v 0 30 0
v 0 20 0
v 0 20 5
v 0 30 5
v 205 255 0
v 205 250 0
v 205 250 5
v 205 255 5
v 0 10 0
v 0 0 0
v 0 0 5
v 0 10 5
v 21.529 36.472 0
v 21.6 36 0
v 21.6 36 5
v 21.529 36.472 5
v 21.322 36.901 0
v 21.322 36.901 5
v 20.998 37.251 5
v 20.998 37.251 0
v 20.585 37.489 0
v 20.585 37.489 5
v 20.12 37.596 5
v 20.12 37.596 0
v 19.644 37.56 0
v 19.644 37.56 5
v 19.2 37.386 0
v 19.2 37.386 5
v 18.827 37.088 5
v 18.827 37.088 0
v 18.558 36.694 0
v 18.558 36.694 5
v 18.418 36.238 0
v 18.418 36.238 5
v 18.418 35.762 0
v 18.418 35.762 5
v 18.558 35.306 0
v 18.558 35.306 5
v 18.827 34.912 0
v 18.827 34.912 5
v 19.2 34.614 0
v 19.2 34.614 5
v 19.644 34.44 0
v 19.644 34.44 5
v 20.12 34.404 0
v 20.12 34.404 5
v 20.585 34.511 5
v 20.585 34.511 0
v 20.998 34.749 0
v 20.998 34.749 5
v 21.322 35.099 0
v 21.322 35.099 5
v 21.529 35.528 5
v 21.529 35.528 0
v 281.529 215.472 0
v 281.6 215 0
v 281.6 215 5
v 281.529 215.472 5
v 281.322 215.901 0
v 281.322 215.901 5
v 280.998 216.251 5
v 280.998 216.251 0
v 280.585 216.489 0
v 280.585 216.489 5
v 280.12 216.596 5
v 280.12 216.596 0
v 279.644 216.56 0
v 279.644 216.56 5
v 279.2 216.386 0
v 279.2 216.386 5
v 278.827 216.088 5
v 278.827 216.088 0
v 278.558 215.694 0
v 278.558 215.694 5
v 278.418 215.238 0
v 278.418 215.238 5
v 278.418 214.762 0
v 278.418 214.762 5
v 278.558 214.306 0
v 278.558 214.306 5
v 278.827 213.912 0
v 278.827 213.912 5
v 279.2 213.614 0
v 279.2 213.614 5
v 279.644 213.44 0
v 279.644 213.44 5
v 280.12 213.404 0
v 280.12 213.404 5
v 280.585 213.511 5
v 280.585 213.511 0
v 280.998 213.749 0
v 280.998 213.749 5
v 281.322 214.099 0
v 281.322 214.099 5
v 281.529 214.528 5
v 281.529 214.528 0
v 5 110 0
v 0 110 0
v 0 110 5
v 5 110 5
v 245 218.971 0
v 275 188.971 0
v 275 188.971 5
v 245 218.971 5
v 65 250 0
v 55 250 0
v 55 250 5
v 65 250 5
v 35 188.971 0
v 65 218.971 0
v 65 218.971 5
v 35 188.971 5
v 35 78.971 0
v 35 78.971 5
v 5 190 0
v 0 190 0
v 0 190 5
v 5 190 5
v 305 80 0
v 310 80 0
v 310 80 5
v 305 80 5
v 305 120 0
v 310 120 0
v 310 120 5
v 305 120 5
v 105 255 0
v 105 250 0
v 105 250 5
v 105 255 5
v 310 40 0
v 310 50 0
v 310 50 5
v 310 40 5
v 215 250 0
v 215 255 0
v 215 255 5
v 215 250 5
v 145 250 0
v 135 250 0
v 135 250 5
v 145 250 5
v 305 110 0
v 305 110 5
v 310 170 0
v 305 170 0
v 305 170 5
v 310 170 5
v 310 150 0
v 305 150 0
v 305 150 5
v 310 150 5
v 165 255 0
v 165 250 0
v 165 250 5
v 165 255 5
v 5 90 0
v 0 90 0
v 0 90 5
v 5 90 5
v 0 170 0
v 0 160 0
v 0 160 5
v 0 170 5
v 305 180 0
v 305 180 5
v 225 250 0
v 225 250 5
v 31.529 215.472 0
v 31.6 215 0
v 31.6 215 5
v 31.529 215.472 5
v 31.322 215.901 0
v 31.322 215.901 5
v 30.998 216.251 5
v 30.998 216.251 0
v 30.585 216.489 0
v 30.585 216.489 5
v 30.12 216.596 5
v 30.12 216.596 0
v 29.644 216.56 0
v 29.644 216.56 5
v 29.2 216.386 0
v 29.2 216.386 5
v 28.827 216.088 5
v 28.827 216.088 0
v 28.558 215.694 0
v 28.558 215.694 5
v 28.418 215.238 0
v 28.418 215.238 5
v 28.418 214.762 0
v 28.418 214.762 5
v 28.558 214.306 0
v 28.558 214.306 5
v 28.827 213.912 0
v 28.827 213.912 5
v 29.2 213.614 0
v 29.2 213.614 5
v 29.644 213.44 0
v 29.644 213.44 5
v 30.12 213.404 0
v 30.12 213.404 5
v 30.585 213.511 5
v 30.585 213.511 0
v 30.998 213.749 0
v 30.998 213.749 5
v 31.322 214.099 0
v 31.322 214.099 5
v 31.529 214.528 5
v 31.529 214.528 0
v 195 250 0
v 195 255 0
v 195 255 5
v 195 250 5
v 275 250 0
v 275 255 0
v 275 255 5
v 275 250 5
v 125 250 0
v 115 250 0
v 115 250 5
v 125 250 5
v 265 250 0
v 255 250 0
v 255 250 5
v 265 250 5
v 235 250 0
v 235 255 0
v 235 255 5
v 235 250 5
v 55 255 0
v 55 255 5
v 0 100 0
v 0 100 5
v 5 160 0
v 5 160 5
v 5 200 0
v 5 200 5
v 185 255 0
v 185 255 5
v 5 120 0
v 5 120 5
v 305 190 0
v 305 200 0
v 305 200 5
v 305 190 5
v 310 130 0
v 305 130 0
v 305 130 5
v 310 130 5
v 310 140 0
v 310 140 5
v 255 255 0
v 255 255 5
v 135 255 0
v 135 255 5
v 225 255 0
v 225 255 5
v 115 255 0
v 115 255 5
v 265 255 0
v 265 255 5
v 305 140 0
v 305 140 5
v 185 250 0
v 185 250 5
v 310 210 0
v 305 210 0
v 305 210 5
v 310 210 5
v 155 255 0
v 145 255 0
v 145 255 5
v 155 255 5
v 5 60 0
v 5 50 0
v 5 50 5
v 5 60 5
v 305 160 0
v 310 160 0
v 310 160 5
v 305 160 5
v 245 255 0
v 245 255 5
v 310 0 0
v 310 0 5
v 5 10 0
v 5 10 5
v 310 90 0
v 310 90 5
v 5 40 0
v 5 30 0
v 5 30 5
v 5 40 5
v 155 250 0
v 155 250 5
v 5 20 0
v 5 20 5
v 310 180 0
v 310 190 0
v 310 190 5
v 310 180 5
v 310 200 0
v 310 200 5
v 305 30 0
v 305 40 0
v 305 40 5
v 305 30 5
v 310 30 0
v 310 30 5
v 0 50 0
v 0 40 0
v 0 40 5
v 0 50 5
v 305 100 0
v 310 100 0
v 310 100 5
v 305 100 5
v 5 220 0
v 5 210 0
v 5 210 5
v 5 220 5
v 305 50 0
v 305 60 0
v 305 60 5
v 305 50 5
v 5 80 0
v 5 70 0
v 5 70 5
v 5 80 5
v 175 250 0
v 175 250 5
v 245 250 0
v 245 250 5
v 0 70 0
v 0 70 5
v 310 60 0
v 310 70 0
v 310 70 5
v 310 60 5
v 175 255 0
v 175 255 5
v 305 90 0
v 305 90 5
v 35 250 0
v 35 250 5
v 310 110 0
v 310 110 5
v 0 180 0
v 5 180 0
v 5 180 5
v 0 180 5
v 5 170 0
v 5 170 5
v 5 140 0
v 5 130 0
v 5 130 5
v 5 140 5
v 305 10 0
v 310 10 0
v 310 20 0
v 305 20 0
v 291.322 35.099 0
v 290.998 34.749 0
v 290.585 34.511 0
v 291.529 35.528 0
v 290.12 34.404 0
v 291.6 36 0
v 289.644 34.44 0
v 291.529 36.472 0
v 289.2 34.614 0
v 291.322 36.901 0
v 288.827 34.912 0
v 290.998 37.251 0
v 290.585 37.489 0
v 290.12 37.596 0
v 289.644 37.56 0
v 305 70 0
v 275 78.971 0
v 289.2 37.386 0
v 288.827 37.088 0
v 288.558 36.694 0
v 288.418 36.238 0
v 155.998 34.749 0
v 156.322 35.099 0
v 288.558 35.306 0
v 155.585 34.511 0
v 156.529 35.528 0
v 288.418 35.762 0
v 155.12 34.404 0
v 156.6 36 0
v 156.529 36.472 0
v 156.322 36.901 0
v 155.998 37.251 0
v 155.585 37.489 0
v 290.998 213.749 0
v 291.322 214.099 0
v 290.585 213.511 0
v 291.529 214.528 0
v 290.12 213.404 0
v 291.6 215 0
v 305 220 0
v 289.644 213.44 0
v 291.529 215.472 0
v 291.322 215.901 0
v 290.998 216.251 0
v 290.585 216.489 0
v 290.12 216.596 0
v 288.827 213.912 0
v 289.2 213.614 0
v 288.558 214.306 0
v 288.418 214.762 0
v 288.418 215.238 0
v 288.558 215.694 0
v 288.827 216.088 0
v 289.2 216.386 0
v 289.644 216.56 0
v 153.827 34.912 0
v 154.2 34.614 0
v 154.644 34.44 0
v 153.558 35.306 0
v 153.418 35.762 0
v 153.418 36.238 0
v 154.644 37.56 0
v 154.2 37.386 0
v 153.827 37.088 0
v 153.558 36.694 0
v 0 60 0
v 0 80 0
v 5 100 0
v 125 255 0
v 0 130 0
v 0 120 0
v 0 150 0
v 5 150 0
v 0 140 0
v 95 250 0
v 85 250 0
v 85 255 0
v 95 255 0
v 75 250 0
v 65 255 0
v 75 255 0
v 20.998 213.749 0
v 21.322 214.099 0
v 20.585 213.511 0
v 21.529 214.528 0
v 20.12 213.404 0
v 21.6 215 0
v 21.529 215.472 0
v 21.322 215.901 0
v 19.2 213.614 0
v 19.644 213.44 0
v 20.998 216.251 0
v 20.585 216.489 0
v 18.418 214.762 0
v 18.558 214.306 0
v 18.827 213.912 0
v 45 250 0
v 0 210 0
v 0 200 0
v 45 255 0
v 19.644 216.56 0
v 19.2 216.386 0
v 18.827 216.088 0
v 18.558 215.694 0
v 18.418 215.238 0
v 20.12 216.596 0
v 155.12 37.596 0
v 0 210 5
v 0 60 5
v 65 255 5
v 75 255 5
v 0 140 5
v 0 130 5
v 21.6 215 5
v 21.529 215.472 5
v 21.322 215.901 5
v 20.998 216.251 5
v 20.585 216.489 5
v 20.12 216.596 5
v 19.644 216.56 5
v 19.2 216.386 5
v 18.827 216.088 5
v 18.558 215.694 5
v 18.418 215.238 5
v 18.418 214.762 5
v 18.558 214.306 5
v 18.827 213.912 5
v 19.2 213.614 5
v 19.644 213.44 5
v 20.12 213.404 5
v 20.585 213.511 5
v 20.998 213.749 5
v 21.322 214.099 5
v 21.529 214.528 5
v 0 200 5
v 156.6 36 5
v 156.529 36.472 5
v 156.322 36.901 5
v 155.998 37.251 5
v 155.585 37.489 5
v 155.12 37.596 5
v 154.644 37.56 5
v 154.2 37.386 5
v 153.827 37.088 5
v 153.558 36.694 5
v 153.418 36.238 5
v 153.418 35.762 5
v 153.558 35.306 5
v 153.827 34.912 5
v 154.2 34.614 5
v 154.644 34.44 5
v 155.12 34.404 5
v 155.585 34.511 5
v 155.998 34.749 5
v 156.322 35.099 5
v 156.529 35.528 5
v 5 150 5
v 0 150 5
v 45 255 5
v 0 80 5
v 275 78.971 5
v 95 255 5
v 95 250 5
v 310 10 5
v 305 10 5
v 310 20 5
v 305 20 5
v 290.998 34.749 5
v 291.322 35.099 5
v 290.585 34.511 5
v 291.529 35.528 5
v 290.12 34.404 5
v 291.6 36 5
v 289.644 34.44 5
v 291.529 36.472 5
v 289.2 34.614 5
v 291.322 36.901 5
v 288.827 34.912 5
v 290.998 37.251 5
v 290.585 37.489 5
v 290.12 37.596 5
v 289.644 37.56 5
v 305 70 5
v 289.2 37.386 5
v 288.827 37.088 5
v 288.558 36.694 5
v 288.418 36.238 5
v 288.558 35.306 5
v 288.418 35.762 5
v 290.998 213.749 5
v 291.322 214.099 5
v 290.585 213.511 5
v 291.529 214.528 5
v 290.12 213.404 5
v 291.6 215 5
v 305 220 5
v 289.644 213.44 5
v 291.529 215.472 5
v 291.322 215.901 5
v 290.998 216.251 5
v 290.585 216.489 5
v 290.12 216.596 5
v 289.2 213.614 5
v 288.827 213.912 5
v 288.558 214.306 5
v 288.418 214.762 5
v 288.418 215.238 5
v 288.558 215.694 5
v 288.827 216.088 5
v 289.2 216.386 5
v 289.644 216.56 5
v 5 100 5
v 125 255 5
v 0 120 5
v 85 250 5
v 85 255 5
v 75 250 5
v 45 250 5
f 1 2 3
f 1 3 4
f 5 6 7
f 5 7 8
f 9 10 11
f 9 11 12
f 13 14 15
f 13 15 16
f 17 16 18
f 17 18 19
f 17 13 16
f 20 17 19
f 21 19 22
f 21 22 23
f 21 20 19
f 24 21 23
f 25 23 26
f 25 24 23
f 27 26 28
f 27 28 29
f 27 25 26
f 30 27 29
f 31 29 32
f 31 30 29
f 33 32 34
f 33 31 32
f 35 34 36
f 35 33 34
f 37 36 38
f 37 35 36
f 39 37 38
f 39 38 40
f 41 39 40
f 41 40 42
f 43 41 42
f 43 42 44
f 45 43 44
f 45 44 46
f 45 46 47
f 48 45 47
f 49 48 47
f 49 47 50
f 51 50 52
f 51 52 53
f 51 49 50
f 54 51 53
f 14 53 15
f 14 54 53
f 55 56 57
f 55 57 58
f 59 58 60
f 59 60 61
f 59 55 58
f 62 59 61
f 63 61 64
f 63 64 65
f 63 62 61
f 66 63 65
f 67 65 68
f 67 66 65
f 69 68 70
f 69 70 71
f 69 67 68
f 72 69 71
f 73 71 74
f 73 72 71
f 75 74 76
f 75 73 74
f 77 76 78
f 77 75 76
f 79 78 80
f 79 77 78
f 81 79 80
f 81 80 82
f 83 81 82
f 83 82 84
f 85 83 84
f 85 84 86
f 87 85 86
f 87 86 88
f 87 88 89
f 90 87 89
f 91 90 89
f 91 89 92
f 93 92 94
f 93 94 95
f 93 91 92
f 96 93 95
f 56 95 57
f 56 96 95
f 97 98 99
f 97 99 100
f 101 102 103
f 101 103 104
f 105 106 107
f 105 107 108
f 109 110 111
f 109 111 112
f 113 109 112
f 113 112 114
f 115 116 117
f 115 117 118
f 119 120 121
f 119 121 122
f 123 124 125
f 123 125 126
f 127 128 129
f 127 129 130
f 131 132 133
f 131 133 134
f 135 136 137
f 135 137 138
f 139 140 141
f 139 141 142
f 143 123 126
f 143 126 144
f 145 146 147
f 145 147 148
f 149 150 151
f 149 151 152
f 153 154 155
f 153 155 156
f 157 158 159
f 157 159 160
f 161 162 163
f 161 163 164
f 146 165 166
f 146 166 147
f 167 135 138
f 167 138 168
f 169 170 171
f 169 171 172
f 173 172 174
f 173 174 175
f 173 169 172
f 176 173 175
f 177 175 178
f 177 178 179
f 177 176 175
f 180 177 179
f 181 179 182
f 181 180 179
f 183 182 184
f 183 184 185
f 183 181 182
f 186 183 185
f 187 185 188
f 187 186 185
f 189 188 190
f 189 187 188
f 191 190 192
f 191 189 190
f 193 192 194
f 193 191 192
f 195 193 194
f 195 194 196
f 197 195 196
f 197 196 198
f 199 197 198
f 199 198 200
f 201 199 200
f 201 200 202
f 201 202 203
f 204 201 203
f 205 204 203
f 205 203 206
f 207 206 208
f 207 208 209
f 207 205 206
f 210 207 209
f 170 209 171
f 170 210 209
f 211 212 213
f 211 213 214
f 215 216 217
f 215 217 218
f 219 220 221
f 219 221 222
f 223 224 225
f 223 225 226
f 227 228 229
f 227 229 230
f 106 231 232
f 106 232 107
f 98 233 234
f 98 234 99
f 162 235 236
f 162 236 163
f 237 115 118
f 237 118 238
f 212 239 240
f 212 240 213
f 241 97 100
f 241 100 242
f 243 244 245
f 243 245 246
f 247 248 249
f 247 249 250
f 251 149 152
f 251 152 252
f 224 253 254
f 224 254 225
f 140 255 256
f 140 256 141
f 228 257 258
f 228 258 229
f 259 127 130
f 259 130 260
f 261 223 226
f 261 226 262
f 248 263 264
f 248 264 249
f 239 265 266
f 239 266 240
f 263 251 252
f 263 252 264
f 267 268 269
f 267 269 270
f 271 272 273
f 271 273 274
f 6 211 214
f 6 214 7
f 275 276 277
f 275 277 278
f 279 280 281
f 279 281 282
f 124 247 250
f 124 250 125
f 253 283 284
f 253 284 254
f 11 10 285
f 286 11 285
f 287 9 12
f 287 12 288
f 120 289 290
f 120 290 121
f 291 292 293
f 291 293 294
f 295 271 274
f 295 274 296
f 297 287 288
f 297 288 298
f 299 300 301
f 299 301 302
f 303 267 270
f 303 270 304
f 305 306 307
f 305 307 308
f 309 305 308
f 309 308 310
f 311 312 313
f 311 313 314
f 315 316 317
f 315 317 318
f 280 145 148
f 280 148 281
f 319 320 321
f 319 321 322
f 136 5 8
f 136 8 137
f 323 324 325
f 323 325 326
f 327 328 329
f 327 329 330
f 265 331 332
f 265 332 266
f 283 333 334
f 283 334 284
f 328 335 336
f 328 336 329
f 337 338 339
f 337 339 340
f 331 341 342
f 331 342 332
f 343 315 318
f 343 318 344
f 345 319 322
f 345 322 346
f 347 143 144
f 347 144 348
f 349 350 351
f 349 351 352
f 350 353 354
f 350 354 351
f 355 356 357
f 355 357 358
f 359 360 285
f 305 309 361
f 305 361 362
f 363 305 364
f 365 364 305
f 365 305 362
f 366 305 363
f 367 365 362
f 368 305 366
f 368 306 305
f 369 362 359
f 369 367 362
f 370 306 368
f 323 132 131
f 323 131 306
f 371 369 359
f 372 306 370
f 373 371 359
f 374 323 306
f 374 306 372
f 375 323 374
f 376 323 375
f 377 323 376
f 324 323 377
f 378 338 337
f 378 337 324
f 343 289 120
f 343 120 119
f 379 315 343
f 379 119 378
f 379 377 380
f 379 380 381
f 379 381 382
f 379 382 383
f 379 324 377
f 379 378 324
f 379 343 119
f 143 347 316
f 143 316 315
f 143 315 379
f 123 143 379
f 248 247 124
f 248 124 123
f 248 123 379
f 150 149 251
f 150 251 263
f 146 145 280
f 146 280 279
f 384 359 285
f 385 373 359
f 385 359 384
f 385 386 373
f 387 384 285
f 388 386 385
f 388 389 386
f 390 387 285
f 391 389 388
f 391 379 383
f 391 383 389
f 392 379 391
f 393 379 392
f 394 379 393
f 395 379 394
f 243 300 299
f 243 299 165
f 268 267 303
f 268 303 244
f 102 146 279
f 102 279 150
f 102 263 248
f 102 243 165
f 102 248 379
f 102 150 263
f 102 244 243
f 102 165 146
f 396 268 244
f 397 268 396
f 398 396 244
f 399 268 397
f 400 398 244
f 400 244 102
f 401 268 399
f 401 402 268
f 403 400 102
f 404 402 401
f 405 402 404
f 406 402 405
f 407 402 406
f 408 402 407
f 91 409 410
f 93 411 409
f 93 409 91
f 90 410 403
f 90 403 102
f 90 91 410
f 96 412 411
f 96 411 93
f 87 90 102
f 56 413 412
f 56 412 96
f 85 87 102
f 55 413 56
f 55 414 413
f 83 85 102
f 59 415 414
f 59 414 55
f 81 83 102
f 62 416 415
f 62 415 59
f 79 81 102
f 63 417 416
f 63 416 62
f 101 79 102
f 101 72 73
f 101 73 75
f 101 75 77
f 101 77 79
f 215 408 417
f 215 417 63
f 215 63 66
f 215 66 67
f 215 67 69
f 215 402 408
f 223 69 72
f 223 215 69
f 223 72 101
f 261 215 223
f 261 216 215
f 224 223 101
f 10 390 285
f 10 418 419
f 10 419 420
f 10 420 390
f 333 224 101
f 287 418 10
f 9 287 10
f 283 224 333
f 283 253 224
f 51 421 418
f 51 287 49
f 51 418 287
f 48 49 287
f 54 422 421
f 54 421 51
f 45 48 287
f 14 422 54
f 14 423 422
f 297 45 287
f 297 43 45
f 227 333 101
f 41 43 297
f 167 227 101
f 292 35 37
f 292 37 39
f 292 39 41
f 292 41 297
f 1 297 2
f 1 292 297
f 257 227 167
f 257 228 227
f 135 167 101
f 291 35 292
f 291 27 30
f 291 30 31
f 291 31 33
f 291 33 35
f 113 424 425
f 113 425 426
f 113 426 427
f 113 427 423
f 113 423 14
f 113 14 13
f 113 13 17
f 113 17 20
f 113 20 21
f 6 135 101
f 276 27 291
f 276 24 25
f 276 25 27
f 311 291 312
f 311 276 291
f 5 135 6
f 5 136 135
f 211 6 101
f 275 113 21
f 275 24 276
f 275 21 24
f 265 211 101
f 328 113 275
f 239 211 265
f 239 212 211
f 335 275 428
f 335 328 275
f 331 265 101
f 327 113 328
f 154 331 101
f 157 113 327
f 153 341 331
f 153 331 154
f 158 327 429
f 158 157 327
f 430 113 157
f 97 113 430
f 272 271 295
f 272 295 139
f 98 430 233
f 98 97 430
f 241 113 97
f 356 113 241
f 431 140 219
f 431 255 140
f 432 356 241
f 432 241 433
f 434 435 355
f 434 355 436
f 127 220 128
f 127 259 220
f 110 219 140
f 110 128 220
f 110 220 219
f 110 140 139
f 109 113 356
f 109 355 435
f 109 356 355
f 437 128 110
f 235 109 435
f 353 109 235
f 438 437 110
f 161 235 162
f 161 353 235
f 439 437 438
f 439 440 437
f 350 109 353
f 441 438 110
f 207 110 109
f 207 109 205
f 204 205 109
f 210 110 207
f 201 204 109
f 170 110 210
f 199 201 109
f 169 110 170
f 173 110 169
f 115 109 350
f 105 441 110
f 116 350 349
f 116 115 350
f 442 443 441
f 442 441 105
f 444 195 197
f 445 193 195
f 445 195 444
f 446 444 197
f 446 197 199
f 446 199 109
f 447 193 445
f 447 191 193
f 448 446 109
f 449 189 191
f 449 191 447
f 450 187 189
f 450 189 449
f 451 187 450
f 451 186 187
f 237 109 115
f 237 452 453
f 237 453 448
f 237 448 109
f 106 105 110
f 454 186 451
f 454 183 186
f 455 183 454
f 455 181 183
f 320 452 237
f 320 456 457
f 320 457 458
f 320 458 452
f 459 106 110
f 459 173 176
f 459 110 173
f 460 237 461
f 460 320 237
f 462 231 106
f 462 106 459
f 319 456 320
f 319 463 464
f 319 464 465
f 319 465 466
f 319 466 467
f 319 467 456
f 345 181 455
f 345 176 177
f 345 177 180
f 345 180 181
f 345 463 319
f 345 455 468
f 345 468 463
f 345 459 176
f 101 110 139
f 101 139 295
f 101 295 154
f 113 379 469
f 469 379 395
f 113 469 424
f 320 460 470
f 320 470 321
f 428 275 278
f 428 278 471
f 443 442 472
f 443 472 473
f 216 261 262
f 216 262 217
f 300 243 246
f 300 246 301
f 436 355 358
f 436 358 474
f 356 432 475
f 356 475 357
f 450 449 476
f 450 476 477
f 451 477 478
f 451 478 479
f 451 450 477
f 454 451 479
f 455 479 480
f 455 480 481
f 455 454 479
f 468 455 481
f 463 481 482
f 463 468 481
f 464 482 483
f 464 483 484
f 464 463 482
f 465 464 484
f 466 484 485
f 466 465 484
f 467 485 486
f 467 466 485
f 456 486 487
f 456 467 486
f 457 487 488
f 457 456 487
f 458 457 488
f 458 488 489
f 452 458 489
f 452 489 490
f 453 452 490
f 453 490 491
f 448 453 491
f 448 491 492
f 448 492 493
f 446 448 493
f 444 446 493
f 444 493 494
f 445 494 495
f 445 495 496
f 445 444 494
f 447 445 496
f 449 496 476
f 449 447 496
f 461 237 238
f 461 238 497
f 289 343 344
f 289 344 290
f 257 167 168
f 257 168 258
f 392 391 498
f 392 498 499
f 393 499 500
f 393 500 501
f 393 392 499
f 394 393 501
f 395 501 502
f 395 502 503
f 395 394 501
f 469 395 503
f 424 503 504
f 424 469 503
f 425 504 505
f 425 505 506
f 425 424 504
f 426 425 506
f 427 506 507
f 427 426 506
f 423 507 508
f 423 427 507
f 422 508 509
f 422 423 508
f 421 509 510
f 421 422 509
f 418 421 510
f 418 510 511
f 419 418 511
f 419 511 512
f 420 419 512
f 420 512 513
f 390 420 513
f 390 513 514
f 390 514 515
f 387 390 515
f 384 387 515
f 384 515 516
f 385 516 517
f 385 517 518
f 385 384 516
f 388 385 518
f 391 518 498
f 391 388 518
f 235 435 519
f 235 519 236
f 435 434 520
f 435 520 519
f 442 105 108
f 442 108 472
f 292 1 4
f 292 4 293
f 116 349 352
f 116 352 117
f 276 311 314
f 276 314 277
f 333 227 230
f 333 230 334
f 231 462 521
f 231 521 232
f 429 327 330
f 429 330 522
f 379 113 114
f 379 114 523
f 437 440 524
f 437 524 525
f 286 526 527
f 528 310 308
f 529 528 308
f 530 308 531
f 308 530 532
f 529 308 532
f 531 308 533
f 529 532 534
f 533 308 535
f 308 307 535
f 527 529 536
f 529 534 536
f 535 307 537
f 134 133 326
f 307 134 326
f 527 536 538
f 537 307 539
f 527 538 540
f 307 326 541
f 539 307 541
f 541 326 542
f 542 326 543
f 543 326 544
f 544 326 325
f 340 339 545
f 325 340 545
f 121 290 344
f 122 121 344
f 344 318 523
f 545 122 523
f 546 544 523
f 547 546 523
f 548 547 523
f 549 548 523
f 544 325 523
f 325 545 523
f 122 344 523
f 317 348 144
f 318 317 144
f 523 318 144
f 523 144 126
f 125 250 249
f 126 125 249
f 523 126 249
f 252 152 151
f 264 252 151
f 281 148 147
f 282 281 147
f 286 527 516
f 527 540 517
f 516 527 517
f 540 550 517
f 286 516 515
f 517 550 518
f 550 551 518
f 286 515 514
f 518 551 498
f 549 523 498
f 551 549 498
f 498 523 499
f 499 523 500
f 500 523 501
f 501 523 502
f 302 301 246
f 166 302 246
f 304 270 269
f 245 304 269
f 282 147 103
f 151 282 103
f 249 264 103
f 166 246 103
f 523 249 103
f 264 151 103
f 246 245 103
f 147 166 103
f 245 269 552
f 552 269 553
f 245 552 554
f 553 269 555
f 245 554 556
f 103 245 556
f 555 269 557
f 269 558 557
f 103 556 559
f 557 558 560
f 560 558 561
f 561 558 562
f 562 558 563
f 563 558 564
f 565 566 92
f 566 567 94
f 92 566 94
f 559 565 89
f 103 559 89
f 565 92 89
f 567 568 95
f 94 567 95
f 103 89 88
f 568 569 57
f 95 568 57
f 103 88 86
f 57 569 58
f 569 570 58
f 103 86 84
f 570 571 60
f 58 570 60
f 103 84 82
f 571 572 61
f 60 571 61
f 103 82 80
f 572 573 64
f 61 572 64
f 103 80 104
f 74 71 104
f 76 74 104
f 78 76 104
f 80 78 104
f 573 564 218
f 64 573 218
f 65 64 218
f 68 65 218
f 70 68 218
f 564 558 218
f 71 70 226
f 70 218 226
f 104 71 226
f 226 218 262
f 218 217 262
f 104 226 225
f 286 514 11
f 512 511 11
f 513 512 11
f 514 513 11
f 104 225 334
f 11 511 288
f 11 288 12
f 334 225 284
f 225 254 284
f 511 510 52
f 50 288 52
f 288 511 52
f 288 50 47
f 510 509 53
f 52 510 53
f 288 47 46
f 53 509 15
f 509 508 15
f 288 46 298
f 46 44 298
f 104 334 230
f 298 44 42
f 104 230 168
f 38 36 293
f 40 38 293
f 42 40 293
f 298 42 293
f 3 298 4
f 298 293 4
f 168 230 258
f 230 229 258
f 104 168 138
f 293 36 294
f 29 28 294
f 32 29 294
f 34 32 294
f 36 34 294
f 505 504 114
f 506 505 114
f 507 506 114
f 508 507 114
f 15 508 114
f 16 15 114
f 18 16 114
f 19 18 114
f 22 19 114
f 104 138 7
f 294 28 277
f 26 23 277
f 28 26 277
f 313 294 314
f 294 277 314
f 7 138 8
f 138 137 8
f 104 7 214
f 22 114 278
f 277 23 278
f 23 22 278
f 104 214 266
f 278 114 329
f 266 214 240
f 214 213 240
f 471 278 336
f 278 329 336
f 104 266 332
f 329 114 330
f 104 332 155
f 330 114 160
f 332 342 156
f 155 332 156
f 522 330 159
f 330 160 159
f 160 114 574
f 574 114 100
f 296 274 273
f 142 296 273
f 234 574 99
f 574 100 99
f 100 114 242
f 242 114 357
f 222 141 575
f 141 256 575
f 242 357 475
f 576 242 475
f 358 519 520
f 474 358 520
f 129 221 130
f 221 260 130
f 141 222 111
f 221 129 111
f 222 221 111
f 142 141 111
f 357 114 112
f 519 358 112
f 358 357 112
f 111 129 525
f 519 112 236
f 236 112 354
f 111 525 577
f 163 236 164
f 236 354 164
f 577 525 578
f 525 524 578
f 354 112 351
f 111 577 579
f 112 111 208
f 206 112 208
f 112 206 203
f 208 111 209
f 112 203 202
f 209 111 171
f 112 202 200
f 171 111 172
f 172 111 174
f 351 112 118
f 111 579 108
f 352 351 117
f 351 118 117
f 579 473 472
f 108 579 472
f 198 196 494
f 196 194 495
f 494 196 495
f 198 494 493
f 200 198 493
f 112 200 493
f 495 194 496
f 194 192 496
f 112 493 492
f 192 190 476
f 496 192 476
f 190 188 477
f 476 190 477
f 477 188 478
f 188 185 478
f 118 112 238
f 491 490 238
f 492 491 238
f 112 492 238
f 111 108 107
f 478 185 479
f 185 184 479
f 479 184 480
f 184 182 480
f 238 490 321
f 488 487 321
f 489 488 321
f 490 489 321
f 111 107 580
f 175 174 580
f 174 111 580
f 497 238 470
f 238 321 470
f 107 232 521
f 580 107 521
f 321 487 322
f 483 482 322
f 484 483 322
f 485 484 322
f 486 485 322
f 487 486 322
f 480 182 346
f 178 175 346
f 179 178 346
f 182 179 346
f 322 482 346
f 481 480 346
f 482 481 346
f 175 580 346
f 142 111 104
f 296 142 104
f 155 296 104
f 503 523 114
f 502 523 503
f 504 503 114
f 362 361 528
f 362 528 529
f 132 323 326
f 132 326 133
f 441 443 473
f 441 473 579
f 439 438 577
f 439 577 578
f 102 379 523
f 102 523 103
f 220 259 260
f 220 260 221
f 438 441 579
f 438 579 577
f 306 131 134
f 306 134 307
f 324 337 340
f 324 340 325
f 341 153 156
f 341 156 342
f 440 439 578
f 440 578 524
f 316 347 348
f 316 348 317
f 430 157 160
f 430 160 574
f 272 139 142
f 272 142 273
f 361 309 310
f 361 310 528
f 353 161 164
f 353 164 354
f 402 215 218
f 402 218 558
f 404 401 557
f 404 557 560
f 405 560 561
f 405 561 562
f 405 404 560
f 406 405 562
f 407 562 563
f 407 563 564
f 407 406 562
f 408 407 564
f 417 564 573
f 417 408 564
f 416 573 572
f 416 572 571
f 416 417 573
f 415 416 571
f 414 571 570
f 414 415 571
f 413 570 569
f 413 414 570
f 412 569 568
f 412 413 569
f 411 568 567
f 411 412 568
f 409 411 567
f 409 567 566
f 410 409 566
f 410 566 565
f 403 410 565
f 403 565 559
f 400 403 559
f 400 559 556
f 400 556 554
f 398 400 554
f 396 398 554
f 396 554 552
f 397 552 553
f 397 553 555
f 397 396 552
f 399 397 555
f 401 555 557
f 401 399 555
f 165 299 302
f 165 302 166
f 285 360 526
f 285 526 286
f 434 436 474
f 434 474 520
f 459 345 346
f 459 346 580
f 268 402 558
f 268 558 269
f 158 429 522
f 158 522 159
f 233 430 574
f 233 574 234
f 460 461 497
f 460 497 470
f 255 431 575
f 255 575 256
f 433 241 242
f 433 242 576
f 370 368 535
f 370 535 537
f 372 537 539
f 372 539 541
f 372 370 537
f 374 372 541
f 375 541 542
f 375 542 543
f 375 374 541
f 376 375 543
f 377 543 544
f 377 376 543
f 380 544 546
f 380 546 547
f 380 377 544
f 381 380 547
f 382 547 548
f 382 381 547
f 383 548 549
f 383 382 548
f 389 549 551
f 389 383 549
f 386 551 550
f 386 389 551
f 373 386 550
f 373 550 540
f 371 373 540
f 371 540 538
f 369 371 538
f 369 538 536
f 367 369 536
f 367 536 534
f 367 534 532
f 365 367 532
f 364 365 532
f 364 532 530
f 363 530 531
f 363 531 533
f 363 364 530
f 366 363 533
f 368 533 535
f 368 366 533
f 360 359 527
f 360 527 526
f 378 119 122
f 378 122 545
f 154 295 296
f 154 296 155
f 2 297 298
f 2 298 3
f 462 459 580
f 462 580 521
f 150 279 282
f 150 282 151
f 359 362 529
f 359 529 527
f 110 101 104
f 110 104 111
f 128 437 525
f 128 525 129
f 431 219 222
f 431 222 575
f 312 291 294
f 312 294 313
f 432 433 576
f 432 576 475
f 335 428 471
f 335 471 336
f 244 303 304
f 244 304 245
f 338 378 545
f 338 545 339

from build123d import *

# Parameters (mm, degrees)
SKIZZE1_R                       = 1.6
AUFSATZ_LINEAR_AUSTRAGEN1_DEPTH = 5


with BuildPart() as part:
    # Skizze1 → Aufsatz-Linear austragen1 (new body)
    with BuildSketch(Plane.XY):
        Polygon((5, 10), (5, 20), (0, 20), (0, 30), (5, 30), (5, 40), (0, 40), (0, 50), (5, 50), (5, 60), (0, 60), (0, 70), (5, 70), (5, 80), (0, 80), (0, 90), (5, 90), (5, 100), (0, 100), (0, 110), (5, 110), (5, 120), (0, 120), (0, 130), (5, 130), (5, 140), (0, 140), (0, 150), (5, 150), (5, 160), (0, 160), (0, 170), (5, 170), (5, 180), (0, 180), (0, 190), (5, 190), (5, 200), (0, 200), (0, 210), (5, 210), (5, 220), (35, 250), (45, 250), (45, 255), (55, 255), (55, 250), (65, 250), (65, 255), (75, 255), (75, 250), (85, 250), (85, 255), (95, 255), (95, 250), (105, 250), (105, 255), (115, 255), (115, 250), (125, 250), (125, 255), (135, 255), (135, 250), (145, 250), (145, 255), (155, 255), (155, 250), (165, 250), (165, 255), (175, 255), (175, 250), (185, 250), (185, 255), (195, 255), (195, 250), (205, 250), (205, 255), (215, 255), (215, 250), (225, 250), (225, 255), (235, 255), (235, 250), (245, 250), (245, 255), (255, 255), (255, 250), (265, 250), (265, 255), (275, 255), (275, 250), (305, 220), (305, 210), (310, 210), (310, 200), (305, 200), (305, 190), (310, 190), (310, 180), (305, 180), (305, 170), (310, 170), (310, 160), (305, 160), (305, 150), (310, 150), (310, 140), (305, 140), (305, 130), (310, 130), (310, 120), (305, 120), (305, 110), (310, 110), (310, 100), (305, 100), (305, 90), (310, 90), (310, 80), (305, 80), (305, 70), (310, 70), (310, 60), (305, 60), (305, 50), (310, 50), (310, 40), (305, 40), (305, 30), (310, 30), (310, 20), (305, 20), (305, 10), (310, 10), (310, 0), (305, 0), (5, 0), (0, 0), (0, 10), align=None)
        with Locations((290, 214.999999999)):
            Circle(SKIZZE1_R, mode=Mode.SUBTRACT)
        with Locations((280, 214.999999999)):
            Circle(SKIZZE1_R, mode=Mode.SUBTRACT)
        with Locations((20, 215)):
            Circle(SKIZZE1_R, mode=Mode.SUBTRACT)
        with Locations((30, 215)):
            Circle(SKIZZE1_R, mode=Mode.SUBTRACT)
        with Locations((20, 36)):
            Circle(SKIZZE1_R, mode=Mode.SUBTRACT)
        with Locations((155, 36)):
            Circle(SKIZZE1_R, mode=Mode.SUBTRACT)
        with Locations((290, 36)):
            Circle(SKIZZE1_R, mode=Mode.SUBTRACT)
        Polygon((275, 188.971165398), (245, 218.971165398), (65, 218.971165398), (35, 188.971165398), (35, 78.971165398), (275, 78.971165398), align=None, mode=Mode.SUBTRACT)
    extrude(amount=AUFSATZ_LINEAR_AUSTRAGEN1_DEPTH)


solid = part.part
